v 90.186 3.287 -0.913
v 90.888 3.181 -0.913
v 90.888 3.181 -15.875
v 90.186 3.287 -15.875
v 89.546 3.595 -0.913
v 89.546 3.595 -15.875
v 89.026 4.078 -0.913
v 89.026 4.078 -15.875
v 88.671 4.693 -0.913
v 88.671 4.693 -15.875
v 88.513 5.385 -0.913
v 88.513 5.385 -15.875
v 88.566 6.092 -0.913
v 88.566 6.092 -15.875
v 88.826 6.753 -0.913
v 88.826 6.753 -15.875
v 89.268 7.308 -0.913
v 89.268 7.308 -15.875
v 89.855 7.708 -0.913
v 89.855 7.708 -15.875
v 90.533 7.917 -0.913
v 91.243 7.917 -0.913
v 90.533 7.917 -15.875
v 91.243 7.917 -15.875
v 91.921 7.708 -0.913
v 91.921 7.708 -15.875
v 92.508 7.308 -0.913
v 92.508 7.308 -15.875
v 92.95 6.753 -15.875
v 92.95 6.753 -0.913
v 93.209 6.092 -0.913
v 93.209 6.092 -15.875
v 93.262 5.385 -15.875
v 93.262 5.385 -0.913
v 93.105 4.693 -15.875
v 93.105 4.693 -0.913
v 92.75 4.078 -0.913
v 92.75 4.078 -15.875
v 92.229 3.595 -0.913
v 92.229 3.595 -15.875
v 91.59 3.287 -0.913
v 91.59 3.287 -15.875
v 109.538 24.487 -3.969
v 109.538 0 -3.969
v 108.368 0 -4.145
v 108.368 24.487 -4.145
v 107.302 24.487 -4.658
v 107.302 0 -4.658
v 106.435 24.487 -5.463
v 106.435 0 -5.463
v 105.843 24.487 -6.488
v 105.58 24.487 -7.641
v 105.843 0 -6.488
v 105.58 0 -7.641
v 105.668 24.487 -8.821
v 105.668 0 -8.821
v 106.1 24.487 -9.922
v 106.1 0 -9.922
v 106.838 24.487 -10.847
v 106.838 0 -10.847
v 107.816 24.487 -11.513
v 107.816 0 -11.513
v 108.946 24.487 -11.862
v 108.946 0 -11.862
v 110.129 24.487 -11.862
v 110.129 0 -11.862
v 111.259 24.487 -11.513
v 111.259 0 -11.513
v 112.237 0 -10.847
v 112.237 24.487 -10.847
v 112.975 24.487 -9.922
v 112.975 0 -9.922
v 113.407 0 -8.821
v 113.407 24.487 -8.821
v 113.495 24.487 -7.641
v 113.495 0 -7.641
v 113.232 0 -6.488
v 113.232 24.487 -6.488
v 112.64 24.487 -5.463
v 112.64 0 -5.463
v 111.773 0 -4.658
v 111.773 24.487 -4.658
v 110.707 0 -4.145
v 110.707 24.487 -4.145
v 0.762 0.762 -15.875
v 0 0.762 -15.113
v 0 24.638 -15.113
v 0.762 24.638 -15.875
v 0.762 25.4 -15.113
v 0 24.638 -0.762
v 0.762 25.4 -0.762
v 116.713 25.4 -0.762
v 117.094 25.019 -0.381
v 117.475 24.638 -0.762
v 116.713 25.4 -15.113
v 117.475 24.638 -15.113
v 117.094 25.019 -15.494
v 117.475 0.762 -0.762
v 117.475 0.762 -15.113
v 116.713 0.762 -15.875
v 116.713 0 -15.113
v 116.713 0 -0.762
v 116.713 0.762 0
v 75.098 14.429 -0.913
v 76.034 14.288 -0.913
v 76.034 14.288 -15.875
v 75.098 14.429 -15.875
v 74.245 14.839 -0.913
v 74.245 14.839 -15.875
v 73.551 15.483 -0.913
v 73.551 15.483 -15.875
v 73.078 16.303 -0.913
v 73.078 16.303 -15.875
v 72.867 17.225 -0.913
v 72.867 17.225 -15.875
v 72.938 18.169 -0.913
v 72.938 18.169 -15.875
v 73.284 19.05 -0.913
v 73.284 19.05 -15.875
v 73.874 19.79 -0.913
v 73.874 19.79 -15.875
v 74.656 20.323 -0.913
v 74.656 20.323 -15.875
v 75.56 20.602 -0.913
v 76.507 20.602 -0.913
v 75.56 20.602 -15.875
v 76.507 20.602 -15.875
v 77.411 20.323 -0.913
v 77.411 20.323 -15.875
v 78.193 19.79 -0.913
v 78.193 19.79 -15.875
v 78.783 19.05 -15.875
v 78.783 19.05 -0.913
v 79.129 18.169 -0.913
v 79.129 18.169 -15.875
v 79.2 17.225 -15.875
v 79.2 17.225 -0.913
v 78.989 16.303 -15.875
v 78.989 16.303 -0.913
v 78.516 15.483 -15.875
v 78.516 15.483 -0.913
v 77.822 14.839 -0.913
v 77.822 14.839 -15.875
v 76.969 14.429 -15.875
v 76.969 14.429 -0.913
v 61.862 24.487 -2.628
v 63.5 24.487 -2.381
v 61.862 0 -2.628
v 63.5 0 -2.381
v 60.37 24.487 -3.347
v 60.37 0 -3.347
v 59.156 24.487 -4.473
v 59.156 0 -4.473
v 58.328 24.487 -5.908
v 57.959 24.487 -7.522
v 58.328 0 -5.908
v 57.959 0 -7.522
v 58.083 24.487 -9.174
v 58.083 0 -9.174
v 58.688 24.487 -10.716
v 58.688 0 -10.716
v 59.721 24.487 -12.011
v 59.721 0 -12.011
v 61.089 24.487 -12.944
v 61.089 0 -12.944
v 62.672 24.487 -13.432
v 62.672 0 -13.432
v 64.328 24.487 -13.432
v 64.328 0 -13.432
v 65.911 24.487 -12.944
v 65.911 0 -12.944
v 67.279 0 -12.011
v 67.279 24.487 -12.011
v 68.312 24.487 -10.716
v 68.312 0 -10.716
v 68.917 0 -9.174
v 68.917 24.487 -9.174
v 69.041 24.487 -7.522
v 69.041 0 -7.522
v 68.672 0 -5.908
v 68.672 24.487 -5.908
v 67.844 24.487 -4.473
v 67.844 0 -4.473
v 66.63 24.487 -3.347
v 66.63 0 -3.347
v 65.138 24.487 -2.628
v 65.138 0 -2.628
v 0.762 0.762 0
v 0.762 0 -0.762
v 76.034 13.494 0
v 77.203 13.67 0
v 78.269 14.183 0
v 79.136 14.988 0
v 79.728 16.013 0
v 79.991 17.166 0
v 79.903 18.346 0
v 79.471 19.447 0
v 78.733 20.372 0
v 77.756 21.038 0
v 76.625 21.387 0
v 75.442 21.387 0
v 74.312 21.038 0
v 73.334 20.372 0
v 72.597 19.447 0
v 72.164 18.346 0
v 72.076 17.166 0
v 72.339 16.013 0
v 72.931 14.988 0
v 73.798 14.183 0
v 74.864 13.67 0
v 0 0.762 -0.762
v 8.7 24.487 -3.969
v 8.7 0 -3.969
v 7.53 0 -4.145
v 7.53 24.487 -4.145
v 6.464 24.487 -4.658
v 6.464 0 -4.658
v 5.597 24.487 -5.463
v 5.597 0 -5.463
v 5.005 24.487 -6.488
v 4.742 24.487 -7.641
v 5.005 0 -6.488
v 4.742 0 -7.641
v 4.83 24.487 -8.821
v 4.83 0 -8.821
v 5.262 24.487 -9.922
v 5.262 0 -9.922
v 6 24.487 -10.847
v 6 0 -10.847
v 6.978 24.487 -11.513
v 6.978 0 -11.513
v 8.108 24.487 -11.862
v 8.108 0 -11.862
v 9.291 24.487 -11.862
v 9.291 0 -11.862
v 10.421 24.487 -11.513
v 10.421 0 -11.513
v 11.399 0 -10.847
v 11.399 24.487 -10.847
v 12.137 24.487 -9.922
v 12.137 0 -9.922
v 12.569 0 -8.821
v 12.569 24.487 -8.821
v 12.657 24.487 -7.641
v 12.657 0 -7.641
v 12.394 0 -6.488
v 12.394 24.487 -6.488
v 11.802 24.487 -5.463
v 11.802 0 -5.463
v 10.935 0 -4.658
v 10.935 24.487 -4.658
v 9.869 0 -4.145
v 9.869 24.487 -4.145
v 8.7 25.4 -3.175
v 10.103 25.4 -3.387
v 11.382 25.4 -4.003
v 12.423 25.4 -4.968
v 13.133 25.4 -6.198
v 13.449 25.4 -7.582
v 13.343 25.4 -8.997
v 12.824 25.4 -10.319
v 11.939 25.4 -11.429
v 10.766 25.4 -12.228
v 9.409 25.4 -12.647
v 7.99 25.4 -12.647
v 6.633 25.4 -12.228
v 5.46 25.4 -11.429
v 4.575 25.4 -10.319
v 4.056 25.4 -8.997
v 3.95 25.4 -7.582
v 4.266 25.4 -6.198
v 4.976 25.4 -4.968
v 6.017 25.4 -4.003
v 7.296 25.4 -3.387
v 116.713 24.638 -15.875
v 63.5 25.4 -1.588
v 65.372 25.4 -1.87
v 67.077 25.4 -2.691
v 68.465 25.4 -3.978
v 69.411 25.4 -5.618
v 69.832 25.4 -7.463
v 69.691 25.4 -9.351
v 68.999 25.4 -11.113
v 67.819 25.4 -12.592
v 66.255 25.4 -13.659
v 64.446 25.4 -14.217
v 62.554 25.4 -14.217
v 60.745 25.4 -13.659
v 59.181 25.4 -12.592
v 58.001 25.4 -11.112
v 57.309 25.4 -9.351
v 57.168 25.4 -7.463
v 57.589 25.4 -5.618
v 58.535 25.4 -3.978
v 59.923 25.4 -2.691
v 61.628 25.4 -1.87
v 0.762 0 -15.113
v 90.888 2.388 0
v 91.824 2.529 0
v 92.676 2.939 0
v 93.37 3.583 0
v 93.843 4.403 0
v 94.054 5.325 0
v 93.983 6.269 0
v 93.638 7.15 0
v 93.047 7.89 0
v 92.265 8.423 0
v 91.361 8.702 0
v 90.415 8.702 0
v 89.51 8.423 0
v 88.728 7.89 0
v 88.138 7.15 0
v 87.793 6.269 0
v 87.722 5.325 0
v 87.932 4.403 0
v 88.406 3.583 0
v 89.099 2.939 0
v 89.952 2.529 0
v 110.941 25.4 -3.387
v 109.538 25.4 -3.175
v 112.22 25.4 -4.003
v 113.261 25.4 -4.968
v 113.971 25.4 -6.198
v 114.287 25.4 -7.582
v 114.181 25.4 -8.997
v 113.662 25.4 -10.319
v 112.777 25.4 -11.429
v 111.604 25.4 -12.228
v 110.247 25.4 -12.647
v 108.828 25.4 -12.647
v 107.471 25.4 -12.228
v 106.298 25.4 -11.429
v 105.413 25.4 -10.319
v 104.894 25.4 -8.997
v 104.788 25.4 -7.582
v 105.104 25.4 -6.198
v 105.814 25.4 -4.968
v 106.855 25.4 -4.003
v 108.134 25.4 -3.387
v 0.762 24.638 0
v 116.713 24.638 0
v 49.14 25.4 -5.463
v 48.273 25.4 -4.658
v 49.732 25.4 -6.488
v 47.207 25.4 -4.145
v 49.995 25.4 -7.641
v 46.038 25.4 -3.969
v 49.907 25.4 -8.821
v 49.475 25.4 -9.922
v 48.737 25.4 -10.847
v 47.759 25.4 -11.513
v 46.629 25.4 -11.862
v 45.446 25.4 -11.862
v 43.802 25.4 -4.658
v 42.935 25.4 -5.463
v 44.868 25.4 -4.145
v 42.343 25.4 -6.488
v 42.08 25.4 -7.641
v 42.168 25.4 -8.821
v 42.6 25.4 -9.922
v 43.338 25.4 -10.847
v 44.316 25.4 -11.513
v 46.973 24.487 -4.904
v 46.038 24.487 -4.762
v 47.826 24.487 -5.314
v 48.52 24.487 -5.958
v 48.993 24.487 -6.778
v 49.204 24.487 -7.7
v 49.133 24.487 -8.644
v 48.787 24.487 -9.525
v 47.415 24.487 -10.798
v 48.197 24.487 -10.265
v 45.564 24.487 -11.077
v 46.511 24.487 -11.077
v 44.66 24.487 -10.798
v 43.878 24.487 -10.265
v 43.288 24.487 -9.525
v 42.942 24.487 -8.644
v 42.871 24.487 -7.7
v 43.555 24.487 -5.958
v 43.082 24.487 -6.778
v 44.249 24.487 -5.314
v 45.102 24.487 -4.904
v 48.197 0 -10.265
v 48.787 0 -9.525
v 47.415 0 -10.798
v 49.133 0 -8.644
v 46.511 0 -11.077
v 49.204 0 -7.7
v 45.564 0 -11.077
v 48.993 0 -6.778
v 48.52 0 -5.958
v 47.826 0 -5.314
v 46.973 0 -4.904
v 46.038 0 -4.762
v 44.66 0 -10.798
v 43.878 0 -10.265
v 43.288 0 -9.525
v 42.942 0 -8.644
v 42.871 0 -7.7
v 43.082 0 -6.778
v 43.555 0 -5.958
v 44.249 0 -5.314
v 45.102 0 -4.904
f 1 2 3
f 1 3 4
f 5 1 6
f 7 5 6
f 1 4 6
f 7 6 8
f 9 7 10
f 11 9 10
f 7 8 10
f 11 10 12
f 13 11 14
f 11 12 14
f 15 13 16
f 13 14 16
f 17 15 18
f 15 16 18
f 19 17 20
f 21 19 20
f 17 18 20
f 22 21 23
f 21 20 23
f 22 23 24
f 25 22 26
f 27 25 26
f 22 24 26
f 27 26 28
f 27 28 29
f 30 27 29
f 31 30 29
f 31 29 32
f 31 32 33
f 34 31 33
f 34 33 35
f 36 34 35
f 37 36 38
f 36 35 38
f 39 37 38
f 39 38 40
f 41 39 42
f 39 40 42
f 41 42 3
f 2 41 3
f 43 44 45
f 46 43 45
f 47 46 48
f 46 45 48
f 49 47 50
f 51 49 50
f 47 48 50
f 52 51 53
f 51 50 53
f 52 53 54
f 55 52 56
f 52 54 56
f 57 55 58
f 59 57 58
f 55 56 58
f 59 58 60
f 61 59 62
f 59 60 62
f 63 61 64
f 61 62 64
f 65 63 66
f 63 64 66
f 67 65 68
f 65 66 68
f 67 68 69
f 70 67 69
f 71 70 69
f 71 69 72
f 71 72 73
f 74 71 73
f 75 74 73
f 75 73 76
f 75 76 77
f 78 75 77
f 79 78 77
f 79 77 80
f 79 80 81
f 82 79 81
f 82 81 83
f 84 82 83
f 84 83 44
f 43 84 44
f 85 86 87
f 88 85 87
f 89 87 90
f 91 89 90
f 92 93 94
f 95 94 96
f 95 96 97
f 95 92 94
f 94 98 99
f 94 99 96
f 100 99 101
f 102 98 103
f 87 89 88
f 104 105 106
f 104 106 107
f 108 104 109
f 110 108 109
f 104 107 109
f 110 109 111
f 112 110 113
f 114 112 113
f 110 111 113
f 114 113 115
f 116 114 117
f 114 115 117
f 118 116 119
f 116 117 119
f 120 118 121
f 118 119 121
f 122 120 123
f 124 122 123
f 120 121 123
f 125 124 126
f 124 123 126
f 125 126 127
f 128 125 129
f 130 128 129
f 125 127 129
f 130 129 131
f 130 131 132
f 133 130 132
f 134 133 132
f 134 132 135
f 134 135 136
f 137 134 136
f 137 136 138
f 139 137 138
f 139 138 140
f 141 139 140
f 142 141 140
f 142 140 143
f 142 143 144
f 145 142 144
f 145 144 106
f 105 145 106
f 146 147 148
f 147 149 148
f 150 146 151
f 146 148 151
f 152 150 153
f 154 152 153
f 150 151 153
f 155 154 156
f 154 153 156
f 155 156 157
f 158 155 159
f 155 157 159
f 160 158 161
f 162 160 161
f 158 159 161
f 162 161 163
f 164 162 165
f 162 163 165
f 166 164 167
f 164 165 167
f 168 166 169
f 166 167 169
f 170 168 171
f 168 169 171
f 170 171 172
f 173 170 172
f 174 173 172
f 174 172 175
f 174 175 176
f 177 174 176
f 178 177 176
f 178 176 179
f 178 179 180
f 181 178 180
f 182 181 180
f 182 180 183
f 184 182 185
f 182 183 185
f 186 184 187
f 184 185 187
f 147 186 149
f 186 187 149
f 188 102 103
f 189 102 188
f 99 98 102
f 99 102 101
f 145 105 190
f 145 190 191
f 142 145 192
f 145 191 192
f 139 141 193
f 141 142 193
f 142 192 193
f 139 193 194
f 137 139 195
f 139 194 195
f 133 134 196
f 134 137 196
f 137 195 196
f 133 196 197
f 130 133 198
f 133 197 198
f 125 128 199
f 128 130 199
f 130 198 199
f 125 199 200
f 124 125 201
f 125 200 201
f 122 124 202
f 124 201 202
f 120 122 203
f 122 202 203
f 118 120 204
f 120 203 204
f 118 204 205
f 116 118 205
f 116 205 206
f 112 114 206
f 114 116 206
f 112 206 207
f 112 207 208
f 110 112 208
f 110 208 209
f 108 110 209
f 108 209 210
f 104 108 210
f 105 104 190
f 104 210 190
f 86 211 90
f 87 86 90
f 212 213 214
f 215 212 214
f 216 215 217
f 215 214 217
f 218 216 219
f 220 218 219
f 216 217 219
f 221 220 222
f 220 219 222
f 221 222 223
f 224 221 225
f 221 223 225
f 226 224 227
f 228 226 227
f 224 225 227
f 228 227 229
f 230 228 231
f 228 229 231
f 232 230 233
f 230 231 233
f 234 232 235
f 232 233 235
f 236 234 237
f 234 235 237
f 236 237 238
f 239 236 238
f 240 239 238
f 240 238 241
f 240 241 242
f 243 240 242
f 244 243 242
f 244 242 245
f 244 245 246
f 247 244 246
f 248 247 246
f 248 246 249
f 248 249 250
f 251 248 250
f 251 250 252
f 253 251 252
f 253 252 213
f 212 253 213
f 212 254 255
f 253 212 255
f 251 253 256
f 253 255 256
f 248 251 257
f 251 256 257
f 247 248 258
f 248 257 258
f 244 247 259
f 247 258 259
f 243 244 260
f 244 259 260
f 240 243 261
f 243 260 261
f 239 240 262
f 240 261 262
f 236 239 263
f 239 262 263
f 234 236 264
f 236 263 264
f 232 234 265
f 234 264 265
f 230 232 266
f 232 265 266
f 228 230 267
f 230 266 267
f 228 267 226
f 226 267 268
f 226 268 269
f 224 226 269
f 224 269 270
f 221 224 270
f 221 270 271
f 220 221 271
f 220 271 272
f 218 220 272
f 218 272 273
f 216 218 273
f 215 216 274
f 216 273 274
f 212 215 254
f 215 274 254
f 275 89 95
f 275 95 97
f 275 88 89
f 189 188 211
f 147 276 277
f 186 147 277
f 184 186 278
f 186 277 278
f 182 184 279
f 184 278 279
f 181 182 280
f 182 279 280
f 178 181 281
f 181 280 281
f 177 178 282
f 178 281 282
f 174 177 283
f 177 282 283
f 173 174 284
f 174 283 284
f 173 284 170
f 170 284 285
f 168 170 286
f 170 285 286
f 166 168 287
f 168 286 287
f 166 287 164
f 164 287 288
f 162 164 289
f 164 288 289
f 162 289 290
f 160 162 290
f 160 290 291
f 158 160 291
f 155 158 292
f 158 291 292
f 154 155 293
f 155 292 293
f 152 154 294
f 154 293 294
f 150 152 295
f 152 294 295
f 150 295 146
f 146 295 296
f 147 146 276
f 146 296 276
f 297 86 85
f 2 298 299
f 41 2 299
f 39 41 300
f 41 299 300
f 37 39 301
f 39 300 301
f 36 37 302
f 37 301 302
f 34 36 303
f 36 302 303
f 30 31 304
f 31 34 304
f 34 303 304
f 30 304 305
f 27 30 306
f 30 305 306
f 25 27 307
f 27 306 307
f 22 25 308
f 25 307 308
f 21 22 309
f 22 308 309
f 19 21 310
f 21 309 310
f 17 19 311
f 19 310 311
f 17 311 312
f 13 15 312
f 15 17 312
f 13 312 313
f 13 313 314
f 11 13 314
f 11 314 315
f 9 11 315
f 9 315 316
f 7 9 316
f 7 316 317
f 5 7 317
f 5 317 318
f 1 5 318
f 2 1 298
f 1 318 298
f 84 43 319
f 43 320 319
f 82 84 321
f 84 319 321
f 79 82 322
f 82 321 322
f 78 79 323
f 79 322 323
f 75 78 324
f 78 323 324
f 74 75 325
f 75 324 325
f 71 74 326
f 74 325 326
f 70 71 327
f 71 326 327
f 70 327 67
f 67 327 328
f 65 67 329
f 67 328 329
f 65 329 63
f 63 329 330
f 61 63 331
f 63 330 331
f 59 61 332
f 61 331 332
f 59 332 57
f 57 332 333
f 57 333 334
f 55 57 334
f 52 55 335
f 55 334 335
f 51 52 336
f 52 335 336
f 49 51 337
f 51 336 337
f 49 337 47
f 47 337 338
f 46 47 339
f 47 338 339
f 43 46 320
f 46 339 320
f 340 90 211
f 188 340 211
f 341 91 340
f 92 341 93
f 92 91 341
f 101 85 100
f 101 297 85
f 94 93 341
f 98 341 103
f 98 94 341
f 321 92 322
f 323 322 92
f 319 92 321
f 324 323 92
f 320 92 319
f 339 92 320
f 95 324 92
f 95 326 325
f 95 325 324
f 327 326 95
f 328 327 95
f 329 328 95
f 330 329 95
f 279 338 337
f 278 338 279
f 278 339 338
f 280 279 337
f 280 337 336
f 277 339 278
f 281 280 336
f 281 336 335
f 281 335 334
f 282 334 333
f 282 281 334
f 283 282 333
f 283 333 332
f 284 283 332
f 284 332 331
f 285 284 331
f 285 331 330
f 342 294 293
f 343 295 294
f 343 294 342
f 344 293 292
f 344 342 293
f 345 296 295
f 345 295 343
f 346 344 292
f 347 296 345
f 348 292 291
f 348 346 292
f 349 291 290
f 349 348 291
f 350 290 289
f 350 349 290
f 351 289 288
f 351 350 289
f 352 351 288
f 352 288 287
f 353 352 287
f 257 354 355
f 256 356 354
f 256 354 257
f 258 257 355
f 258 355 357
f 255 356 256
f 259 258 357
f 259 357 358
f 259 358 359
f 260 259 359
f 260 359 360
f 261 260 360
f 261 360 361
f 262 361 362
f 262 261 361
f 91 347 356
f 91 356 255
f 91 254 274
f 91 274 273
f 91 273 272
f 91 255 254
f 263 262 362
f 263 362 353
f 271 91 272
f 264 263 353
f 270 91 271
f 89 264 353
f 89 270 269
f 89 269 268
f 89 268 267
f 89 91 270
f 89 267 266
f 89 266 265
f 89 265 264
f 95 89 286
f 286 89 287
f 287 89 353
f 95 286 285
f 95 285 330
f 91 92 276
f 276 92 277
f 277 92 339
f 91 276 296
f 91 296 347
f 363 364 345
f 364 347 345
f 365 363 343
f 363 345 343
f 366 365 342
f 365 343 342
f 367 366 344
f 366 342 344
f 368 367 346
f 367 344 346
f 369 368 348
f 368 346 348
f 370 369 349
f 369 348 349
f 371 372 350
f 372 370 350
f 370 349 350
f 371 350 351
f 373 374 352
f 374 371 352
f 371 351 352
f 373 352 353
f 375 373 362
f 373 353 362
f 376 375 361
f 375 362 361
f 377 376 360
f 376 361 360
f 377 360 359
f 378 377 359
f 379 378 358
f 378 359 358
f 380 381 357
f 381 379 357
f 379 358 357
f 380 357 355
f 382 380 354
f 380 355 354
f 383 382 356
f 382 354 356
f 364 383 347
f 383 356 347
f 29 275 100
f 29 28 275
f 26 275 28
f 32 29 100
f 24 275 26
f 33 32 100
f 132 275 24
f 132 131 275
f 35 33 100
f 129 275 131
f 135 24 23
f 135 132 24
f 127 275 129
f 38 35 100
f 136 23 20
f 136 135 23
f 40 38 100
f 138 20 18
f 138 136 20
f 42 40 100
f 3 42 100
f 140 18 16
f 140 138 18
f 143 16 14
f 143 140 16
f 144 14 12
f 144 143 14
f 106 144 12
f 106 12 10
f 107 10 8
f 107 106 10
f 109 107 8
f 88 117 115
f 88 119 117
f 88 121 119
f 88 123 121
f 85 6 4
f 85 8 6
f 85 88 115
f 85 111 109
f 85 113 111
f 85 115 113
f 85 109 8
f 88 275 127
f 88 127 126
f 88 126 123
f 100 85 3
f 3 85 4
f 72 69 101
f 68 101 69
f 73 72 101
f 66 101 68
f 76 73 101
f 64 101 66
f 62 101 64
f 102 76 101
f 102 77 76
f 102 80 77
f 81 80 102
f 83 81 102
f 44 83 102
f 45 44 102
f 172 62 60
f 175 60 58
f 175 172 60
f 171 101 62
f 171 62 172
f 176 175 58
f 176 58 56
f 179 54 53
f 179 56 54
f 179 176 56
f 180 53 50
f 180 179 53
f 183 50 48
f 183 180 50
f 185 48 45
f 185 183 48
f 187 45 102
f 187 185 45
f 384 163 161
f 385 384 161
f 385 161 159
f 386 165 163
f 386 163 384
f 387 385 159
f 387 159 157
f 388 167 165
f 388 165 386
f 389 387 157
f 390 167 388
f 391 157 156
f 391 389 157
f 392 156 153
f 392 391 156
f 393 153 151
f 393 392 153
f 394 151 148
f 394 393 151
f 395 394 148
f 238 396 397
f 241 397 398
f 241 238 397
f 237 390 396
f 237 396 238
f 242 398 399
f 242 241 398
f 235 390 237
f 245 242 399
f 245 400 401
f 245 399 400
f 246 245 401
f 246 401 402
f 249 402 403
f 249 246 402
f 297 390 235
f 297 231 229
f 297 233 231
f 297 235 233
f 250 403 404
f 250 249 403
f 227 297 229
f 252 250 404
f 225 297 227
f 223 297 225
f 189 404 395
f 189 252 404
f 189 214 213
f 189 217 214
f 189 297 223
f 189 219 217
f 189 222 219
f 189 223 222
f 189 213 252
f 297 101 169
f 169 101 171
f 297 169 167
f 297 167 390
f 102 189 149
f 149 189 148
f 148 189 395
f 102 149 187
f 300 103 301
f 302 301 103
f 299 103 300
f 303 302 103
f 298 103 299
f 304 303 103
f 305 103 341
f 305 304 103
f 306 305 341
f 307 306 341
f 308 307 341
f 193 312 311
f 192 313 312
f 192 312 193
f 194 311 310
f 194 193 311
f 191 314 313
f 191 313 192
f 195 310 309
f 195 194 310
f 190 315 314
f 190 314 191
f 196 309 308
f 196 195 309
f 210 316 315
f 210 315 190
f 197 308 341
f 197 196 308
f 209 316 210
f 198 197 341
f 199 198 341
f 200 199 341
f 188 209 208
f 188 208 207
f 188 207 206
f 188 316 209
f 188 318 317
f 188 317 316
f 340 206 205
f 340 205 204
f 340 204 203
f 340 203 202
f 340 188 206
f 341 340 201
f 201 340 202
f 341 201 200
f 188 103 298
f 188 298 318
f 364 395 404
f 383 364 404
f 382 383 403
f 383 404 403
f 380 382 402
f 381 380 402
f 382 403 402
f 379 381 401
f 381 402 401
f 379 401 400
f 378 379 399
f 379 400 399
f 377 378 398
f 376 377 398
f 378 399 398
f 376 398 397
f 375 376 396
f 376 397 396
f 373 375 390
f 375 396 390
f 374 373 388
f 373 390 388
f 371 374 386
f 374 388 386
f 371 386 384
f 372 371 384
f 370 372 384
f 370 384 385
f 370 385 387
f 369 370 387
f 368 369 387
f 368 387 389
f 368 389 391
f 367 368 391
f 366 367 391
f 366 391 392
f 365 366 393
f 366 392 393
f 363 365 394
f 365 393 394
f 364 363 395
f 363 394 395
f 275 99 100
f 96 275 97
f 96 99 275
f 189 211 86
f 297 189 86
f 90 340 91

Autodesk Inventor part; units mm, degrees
ref_plane "YZ Plane" through (0, 0, 0) normal (1, 0, 0) x (0, 1, 0)
ref_plane "XZ Plane" through (0, 0, 0) normal (0, 1, 0) x (-1, 0, 0)
ref_plane "XY Plane" through (0, 0, 0) normal (0, 0, 1) x (1, 0, 0)
sketch "Sketch1" plane through (0, 0, 0) normal (1, 0, 0) x (0, 1, 0)
  line L0 (0, 0) -> (25.4, 0)
  line L1 (25.4, 0) -> (25.4, -15.875)
  line L2 (25.4, -15.875) -> (0, -15.875)
  line L3 (0, -15.875) -> (0, 0)
  dimension "d0" = 25.4
  dimension "d1" = 15.875
extrude "Extrusion1" add sketch "Sketch1" along normal blind 117.475
chamfer "Chamfer1" distance 0.762 angle 45 11 edges at (117.475, 12.7, 0) (117.475, 12.7, -15.875) (117.475, 0, -7.9375) (58.7375, 0, 0) (58.7375, 25.4, 0) (58.7375, 25.4, -15.875) (0, 12.7, 0) (0, 25.4, -7.9375) (0, 12.7, -15.875) (0, 0, -7.9375) (58.7375, 0, -15.875)
sketch "Sketch2" plane through (0.762, 25.4, -15.113) normal (0, 1, 0) x (1, 0, 0)
  line L0 (0, -15.113) -> (115.951, -15.113) projected
  line L1 (0, -15.113) -> (7.9375, -15.113)
  line L2 (7.9375, -15.113) -> (7.9375, -7.1755)
  point P0 (-0.762, -15.113)
  dimension "d7" = 7.9375
  dimension "d8" = 7.9375
hole "Hole1" at (8.6995, 25.4, -7.9375) direction (0, -1, 0) diameter 7.9375 end through all countersink diameter 9.525 countersink angle 82
sketch "Sketch3" plane through (0.762, 25.4, -15.113) normal (0, 1, 0) x (1, 0, 0)
  line L0 (116.713, 0) -> (116.713, -14.351) projected
  line L1 (116.713, -7.1755) -> (45.2755, -7.1755)
  point P0 (-0.762, -15.113)
  dimension "d16" = 71.4375
hole "Hole2" at (46.0375, 25.4, -7.9375) direction (0, -1, 0) diameter 6.35 end through all countersink diameter 7.9375 countersink angle 82
sketch "Sketch4" plane through (0.762, 25.4, -15.113) normal (0, 1, 0) x (1, 0, 0)
  line L0 (116.713, 0) -> (116.713, -14.351) projected
  line L1 (116.713, -7.1755) -> (62.738, -7.1755)
  point P0 (-0.762, -15.113)
  dimension "d24" = 53.975
hole "Hole3" at (63.5, 25.4, -7.9375) direction (0, -1, 0) diameter 11.1125 end through all countersink diameter 12.7 countersink angle 82
sketch "Sketch5" plane through (0.762, 25.4, -15.113) normal (0, 1, 0) x (1, 0, 0)
  line L0 (116.713, 0) -> (116.713, -14.351) projected
  line L1 (116.713, -7.1755) -> (108.7755, -7.1755)
  point P0 (-0.762, -15.113)
  dimension "d32" = 7.9375
hole "Hole4" at (109.5375, 25.4, -7.9375) direction (0, -1, 0) diameter 7.9375 end through all countersink diameter 9.525 countersink angle 82
sketch "Sketch6" plane through (0.762, 0.762, 0) normal (0, 0, 1) x (1, 0, 0)
  line L0 (111.9534, -0.762) -> (111.9534, 4.8006) construction
  line L1 (117.1134, 4.8006) -> (90.1259, 4.8006) construction
  point P0 (-0.762, -0.762)
  dimension "d40" = 5.5626
  dimension "d41" = 26.9875
hole "Hole5" at (90.8879, 5.5626, 0) direction (0, 0, -1) diameter 4.7625 end through all countersink diameter 6.35 countersink angle 82
sketch "Sketch7" plane through (0.762, 0.762, 0) normal (0, 0, 1) x (1, 0, 0)
  line L0 (114.57, -0.762) -> (114.57, 16.7005)
  line L1 (116.5466, 16.7005) -> (75.2716, 16.7005)
  point P0 (-0.762, -0.762)
  dimension "d49" = 17.4625
  dimension "d50" = 41.275
hole "Hole6" at (76.0336, 17.4625, 0) direction (0, 0, -1) diameter 6.35 end through all countersink diameter 7.9375 countersink angle 82
chamfer "Chamfer2" distance 0.762 angle 45 1 edges at (117.475, 25.4, -7.9375)
properties part number "holes1"
